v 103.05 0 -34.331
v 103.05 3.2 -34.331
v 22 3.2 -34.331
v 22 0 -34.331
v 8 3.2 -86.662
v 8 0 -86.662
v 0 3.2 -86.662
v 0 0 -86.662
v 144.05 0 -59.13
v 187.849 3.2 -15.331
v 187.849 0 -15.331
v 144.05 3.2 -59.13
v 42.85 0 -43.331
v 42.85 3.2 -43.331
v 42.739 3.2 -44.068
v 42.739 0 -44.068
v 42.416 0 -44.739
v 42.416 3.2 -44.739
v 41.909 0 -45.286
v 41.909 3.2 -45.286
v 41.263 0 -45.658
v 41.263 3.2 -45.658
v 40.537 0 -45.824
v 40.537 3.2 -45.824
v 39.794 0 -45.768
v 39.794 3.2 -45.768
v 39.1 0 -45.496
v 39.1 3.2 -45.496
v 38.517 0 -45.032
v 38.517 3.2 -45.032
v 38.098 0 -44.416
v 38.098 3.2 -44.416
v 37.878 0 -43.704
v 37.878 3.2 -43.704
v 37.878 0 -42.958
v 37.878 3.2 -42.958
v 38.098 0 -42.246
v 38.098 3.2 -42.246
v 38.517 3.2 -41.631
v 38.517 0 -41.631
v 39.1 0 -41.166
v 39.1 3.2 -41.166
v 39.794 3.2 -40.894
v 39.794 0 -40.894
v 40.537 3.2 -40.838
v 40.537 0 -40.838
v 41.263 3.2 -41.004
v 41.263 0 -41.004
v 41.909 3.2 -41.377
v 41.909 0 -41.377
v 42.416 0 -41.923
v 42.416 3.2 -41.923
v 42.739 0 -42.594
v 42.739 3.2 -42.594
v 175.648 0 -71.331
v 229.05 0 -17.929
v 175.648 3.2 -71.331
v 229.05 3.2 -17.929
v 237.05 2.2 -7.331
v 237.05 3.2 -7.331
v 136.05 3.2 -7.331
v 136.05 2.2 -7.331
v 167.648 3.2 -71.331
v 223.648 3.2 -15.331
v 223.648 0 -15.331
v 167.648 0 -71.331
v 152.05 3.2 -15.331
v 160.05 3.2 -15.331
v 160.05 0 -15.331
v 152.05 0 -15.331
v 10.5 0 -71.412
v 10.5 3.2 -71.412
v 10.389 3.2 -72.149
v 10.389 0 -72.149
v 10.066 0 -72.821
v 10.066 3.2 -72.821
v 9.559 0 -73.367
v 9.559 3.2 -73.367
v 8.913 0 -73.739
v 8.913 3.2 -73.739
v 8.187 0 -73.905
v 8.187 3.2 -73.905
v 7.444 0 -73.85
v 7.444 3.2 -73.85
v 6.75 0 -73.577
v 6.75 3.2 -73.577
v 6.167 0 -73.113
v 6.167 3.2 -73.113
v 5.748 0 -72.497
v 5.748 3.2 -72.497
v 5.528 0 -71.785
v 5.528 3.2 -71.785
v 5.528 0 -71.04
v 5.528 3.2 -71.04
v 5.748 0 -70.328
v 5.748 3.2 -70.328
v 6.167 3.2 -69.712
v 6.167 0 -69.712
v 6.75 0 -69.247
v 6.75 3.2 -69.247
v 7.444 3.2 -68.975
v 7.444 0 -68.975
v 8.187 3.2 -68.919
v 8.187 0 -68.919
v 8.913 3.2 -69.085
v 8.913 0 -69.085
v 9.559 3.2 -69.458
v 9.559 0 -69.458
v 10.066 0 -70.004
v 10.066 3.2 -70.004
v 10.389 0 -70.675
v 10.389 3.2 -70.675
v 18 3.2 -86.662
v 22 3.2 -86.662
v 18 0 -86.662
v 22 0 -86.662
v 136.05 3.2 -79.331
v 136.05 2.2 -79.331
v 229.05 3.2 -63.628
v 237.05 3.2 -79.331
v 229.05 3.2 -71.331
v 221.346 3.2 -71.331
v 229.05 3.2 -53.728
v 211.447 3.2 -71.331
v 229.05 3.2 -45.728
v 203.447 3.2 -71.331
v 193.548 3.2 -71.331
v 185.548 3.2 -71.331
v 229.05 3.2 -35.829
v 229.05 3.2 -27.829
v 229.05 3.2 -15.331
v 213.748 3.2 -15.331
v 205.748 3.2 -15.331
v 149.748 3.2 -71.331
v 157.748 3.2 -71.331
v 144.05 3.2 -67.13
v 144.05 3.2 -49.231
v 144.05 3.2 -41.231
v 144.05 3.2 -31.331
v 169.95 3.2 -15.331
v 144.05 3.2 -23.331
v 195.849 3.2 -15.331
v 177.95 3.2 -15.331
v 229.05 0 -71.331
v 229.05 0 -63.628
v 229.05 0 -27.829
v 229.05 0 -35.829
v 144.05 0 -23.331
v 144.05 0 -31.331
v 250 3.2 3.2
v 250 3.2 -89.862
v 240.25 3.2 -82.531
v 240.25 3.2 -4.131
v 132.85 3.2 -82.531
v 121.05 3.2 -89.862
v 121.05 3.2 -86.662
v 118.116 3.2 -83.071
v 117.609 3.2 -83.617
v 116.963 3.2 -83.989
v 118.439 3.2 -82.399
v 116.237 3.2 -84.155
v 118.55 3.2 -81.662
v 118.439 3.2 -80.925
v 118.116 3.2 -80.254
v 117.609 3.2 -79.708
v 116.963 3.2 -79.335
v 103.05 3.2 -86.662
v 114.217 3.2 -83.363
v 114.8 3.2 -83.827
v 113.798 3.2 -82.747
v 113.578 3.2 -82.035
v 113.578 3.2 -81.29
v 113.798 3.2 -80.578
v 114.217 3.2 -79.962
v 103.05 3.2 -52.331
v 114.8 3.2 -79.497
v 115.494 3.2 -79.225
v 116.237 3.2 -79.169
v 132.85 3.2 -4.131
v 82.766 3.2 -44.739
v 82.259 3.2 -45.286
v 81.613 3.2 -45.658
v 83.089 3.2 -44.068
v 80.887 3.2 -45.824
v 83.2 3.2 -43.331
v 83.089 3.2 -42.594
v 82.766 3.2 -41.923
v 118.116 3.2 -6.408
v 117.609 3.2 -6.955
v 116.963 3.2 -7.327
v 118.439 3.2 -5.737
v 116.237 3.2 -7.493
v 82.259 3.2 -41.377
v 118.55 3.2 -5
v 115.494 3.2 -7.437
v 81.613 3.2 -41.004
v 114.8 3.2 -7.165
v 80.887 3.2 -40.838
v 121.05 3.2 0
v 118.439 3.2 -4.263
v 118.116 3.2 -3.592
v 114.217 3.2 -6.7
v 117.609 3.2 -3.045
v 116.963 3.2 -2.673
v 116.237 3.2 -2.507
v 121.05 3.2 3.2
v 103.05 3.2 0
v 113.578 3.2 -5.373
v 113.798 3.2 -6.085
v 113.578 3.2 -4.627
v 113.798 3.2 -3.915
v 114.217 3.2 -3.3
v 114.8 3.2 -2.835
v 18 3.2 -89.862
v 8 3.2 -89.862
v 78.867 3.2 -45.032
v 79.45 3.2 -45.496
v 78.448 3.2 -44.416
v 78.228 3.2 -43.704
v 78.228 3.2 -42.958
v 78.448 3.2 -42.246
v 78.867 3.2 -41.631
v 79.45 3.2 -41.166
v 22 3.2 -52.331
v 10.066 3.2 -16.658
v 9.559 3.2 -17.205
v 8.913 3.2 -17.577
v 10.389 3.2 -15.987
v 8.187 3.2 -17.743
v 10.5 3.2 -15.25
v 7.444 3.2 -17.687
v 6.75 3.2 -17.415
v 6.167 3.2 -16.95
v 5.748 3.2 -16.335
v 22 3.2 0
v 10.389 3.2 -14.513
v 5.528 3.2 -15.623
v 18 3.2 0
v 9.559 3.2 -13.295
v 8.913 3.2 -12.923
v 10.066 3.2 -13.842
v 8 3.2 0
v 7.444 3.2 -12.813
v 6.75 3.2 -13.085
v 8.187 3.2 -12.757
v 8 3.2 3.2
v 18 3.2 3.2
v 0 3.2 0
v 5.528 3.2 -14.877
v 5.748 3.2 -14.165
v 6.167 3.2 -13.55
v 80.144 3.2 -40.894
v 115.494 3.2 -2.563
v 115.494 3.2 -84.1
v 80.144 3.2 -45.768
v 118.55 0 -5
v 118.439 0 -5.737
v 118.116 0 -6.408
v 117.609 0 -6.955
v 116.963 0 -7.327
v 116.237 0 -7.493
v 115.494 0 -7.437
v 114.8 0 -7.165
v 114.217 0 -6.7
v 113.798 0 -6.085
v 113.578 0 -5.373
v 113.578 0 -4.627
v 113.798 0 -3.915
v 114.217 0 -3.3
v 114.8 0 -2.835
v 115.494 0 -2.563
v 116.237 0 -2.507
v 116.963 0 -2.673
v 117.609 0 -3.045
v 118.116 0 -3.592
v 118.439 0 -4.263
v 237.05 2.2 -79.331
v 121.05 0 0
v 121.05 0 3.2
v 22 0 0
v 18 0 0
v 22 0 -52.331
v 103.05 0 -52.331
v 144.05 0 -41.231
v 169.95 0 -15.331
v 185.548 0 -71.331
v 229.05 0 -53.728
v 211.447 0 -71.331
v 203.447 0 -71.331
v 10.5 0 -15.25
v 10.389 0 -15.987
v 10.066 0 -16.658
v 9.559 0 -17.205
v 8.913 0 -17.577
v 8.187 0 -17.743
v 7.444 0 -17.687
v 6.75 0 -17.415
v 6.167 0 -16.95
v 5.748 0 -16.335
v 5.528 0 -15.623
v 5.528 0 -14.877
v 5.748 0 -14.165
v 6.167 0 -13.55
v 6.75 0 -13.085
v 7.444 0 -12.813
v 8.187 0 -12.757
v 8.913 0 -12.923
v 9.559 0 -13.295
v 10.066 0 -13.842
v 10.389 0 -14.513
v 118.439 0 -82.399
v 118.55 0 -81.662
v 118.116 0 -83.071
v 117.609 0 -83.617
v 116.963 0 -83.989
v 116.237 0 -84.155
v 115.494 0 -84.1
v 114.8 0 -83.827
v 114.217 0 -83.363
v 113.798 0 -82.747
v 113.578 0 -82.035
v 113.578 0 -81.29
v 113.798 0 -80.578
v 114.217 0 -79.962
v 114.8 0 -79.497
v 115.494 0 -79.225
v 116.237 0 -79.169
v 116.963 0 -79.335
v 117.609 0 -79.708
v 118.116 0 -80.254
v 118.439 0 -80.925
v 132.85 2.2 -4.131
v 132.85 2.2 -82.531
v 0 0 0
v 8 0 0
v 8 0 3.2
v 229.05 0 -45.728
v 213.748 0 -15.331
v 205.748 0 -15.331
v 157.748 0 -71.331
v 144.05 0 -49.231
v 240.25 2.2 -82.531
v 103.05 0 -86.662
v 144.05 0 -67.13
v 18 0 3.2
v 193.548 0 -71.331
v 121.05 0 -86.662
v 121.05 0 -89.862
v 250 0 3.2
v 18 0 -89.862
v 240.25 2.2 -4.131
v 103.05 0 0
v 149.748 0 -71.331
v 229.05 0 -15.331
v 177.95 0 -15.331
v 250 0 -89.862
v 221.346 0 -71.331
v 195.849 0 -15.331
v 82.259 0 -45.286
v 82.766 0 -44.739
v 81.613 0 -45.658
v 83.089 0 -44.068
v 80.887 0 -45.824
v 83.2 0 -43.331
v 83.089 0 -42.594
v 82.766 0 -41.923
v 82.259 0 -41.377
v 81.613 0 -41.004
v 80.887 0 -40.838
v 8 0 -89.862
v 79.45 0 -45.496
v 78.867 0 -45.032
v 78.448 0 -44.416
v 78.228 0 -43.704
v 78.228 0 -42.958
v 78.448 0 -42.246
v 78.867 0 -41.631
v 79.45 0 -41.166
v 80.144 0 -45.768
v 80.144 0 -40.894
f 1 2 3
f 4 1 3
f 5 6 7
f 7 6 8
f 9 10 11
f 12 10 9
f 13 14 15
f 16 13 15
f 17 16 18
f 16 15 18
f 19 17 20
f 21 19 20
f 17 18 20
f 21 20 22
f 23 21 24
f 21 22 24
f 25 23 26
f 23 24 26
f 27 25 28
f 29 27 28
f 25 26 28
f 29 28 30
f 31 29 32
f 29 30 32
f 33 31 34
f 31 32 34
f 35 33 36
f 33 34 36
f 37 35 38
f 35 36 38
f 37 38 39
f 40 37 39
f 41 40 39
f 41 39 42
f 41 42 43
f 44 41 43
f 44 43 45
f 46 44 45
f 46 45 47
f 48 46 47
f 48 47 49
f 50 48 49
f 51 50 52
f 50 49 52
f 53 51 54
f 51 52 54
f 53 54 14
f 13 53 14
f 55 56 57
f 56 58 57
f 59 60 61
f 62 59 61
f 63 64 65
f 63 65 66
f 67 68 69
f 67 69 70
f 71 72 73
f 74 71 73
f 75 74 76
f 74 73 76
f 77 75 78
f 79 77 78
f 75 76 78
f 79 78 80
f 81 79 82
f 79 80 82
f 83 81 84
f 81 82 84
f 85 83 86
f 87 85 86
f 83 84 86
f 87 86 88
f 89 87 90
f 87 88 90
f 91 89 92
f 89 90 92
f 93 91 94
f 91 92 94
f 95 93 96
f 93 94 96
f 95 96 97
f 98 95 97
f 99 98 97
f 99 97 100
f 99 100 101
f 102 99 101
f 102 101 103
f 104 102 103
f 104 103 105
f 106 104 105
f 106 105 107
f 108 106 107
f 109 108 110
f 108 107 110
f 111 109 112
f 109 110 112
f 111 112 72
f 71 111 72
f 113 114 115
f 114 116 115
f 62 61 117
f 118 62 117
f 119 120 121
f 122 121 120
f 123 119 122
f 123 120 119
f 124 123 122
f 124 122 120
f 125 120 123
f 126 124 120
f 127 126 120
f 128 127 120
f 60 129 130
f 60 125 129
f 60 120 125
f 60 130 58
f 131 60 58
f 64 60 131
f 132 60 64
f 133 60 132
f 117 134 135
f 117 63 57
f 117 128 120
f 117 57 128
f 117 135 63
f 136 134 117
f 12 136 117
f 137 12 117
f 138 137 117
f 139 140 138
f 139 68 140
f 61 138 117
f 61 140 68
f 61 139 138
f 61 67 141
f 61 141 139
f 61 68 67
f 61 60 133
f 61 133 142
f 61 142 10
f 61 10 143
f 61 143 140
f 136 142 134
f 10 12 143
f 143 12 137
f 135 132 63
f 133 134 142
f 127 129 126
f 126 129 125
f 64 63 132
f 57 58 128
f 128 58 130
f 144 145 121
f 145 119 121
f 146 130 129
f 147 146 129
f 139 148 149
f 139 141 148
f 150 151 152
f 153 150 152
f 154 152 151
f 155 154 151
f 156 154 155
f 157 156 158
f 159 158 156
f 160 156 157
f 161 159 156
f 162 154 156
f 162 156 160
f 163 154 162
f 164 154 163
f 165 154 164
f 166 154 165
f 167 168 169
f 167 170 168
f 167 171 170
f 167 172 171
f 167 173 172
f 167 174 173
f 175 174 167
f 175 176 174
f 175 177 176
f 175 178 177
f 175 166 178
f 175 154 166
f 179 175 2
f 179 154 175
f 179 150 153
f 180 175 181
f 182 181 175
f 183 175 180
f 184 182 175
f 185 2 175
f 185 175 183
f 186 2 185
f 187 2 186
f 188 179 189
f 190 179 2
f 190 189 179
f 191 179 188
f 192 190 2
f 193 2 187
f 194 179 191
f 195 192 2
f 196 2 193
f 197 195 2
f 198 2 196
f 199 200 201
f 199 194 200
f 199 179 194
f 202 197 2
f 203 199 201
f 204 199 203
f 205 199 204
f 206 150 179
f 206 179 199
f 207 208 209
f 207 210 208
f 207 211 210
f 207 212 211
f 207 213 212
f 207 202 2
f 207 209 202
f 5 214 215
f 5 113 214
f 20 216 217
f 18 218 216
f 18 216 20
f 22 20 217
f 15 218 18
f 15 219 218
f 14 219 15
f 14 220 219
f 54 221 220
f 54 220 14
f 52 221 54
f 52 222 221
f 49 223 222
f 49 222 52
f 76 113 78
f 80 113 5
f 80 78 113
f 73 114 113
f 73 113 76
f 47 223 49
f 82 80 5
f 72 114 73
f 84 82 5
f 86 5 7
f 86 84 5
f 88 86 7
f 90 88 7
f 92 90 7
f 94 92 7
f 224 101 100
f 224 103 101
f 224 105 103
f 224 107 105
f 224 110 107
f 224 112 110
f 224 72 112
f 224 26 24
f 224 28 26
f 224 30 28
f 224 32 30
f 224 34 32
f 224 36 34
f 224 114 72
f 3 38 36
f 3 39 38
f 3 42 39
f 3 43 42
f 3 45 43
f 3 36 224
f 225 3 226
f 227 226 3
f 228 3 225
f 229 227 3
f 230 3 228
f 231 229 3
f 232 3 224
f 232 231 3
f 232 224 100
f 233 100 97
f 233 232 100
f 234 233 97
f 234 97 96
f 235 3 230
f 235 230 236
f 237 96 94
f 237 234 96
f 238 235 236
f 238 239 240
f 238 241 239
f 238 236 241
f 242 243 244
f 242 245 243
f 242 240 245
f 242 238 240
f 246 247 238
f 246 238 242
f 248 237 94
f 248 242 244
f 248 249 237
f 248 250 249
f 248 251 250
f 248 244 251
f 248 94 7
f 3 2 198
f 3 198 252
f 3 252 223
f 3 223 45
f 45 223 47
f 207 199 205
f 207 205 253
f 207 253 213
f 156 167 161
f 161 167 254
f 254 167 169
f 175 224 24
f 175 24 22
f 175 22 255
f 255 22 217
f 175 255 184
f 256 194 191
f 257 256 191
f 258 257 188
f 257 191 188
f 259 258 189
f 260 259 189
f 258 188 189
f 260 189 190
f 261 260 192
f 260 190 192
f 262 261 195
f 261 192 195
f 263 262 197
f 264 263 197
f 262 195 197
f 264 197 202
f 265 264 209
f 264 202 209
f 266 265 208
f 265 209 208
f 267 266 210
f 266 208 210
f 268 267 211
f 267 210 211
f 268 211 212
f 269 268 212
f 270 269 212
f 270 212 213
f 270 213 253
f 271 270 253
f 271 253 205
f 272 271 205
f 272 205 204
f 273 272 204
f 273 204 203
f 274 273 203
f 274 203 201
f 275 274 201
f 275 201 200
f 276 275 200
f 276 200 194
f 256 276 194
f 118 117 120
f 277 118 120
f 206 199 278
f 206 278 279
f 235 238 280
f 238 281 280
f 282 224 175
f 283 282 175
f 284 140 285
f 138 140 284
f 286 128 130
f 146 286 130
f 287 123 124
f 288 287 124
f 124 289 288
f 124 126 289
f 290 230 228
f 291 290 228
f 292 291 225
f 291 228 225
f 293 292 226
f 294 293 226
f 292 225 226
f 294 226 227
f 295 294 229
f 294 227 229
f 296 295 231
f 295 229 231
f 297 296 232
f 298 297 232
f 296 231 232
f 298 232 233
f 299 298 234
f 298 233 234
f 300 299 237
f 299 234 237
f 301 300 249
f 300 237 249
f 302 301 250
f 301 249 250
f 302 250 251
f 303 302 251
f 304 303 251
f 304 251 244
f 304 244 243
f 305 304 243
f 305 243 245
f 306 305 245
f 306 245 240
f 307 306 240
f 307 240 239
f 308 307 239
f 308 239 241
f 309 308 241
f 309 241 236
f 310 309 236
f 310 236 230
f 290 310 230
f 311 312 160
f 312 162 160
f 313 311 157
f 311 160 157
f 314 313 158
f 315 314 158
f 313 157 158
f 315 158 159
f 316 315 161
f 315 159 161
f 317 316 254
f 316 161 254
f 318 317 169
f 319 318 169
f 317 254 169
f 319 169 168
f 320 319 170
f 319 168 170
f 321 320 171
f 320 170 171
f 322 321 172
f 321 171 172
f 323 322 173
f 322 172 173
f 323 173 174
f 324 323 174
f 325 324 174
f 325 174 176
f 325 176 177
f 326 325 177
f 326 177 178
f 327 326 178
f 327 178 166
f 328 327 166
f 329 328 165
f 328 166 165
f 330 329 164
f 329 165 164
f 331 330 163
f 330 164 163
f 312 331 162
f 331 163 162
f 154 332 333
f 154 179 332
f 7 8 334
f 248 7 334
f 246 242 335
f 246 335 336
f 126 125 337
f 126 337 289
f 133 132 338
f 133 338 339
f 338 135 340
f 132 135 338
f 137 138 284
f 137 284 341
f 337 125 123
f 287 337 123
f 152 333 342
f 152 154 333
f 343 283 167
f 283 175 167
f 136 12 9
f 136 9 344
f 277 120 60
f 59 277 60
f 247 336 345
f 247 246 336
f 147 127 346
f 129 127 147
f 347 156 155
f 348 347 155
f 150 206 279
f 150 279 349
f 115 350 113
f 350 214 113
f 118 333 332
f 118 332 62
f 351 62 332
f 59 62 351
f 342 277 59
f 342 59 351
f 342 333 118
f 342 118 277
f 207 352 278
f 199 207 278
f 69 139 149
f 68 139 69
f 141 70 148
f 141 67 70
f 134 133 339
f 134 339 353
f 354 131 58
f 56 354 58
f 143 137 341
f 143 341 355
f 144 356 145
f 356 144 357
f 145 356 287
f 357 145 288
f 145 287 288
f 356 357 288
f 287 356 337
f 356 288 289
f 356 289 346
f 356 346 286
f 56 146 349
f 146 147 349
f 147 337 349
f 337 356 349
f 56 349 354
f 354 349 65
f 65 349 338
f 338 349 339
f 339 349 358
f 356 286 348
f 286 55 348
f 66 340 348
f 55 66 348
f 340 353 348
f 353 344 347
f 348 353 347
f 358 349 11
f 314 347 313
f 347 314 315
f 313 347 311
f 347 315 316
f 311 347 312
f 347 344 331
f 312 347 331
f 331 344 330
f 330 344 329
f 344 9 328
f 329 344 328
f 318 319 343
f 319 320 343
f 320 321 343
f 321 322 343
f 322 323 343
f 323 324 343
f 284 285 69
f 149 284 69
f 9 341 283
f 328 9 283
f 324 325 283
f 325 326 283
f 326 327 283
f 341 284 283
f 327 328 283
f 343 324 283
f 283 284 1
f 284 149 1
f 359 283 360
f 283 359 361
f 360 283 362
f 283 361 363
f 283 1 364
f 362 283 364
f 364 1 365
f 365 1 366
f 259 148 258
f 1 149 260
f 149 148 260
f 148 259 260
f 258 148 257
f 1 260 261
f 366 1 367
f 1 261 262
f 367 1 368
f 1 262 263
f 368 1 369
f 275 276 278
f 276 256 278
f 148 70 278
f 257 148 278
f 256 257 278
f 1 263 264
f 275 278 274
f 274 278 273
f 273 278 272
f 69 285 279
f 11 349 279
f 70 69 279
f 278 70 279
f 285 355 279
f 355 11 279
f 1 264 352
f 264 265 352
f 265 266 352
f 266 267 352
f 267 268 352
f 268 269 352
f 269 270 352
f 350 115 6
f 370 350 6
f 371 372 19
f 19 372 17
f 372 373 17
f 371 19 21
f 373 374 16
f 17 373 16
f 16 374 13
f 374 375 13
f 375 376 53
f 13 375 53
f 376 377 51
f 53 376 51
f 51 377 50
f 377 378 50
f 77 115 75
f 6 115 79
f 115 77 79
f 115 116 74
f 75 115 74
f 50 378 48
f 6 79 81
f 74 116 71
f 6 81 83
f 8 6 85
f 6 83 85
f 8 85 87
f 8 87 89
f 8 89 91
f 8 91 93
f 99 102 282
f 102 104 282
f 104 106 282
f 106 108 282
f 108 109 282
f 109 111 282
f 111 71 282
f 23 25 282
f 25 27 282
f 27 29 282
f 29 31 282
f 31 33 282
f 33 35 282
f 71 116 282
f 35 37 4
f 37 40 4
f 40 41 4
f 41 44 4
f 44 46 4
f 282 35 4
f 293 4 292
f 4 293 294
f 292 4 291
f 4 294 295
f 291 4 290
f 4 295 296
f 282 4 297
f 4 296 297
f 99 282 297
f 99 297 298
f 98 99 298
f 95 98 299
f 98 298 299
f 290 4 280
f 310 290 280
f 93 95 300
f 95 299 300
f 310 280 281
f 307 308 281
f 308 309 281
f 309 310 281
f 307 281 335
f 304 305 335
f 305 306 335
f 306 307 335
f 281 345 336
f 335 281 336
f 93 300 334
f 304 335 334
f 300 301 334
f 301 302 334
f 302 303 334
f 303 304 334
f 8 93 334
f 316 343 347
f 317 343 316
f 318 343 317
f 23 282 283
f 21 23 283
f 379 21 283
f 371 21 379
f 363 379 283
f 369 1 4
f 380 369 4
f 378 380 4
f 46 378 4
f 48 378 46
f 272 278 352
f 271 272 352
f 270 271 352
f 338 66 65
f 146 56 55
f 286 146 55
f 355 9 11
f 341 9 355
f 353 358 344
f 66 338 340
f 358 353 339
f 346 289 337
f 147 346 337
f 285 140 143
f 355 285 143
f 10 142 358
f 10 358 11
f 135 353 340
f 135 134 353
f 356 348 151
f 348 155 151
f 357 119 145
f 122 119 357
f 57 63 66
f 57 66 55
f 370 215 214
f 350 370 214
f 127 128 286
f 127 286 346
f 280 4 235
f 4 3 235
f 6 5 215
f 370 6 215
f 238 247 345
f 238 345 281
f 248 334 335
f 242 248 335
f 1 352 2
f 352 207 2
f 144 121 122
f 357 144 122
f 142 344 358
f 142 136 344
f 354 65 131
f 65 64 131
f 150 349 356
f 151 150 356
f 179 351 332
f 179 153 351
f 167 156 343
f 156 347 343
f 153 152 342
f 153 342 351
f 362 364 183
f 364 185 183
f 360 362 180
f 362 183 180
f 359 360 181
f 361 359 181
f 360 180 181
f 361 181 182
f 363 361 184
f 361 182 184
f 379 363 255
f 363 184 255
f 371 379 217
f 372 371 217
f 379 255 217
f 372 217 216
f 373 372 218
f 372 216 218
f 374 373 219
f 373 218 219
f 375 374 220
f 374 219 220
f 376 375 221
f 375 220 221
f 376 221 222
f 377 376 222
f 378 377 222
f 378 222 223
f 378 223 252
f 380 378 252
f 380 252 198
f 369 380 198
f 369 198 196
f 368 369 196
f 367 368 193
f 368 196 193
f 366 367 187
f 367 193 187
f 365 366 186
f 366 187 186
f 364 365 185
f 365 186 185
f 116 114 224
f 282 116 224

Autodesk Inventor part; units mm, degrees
ref_plane "YZ Plane" through (0, 0, 0) normal (1, 0, 0) x (0, 1, 0)
ref_plane "XZ Plane" through (0, 0, 0) normal (0, 1, 0) x (-1, 0, 0)
ref_plane "XY Plane" through (0, 0, 0) normal (0, 0, 1) x (1, 0, 0)
sketch "Sketch9" plane through (0, 0, 0) normal (0, 1, 0) x (-1, 0, 0)
  line L0 (0, 0) -> (-250, 0)
  line L1 (-250, 0) -> (-250, -86.6623)
  line L2 (-250, -86.6623) -> (0, -86.6623)
  line L3 (0, -86.6623) -> (0, 0)
  dimension "d59" = 86.6623
  dimension "d60" = 250
extrude "Extrusion5" add sketch "Sketch9" along normal blind 3.2
sketch "Sketch10" plane through (0, 3.2, 0) normal (0, 1, 0) x (1, 0, 0)
  line L0 (22, 0) -> (103.05, 0)
  line L1 (103.05, 0) -> (103.05, 34.3311)
  line L2 (103.05, 34.3311) -> (22, 34.3311)
  line L3 (22, 34.3311) -> (22, 0)
  line L4 (250, 86.6623) -> (0, 86.6623) projected
  line L5 (103.05, 86.6623) -> (22, 86.6623)
  line L6 (22, 86.6623) -> (22, 52.3311)
  line L7 (22, 52.3311) -> (103.05, 52.3311)
  line L8 (103.05, 52.3311) -> (103.05, 86.6623)
  line L9 (0, 0) -> (250, 0) projected
  line L10 (0, 86.6623) -> (0, 0) projected
  dimension "d63" = 22
  dimension "d64" = 34.3311
  dimension "d65" = 81.05
  dimension "d66" = 34.3311
extrude "Extrusion6" cut sketch "Sketch10" against normal blind 3.2
sketch "Sketch11" plane through (0, 3.2, 0) normal (0, 1, 0) x (1, 0, 0)
  line L0 (237.05, 7.3311) -> (136.05, 7.3311)
  line L1 (136.05, 7.3311) -> (136.05, 79.3311)
  line L2 (136.05, 79.3311) -> (237.05, 79.3311)
  line L3 (237.05, 79.3311) -> (237.05, 7.3311)
  line L4 (103.05, 86.6623) -> (103.05, 52.3311) projected
  line L5 (0, 86.6623) -> (0, 0) projected
  line L6 (103.05, 0) -> (250, 0) projected
  line L7 (121.05, 0) -> (121.05, 86.188) construction
  line L8 (103.05, 34.3311) -> (103.05, 0) projected
  line L9 (240.25, 4.1311) -> (132.85, 4.1311)
  line L10 (132.85, 4.1311) -> (132.85, 82.5311)
  line L11 (132.85, 82.5311) -> (240.25, 82.5311)
  line L12 (240.25, 82.5311) -> (240.25, 4.1311)
  dimension "d69" = 72
  dimension "d70" = 101
  dimension "d71" = 33
  dimension "d72" = 86.6623
  dimension "d73" = 7.3311
  dimension "d74" = 18
  dimension "d75" = 3.2
  dimension "d76" = 3.2
  dimension "d77" = 3.2
  dimension "d78" = 3.2
extrude "Extrusion7" cut sketch "Sketch11" against normal blind 1
sketch "Sketch12" plane through (0, 3.2, 0) normal (0, 1, 0) x (1, 0, 0)
  line L0 (237.05, 7.3311) -> (237.05, 79.3311) projected
  line L1 (237.05, 79.3311) -> (136.05, 79.3311) projected
  line L2 (136.05, 79.3311) -> (136.05, 7.3311) construction
  line L3 (136.05, 7.3311) -> (237.05, 7.3311) projected
  line L4 (144.05, 15.3311) -> (229.05, 15.3311) construction
  line L5 (229.05, 15.3311) -> (229.05, 71.3311) construction
  line L6 (229.05, 71.3311) -> (144.05, 71.3311) construction
  line L7 (144.05, 71.3311) -> (144.05, 15.3311) construction
  line L8 (152.05, 15.3311) -> (144.05, 23.3311)
  line L9 (144.05, 23.3311) -> (144.05, 31.3311)
  line L10 (144.05, 31.3311) -> (160.05, 15.3311)
  line L11 (160.05, 15.3311) -> (152.05, 15.3311)
  line L12 (169.9495, 15.3311) -> (144.05, 41.2306)
  line L13 (144.05, 41.2306) -> (144.05, 49.2306)
  line L14 (144.05, 49.2306) -> (177.9495, 15.3311)
  line L15 (169.9495, 15.3311) -> (177.9495, 15.3311)
  line L16 (187.849, 15.3311) -> (144.05, 59.1301)
  line L17 (144.05, 59.1301) -> (144.05, 67.1301)
  line L18 (144.05, 67.1301) -> (195.849, 15.3311)
  line L19 (195.849, 15.3311) -> (187.849, 15.3311)
  line L20 (213.7485, 15.3311) -> (205.7485, 15.3311)
  line L21 (157.7485, 71.3311) -> (213.7485, 15.3311)
  line L22 (223.648, 15.3311) -> (167.648, 71.3311)
  line L23 (185.5475, 71.3311) -> (193.5475, 71.3311)
  line L24 (193.5475, 71.3311) -> (229.05, 35.8286)
  line L25 (229.05, 45.7281) -> (203.447, 71.3311)
  line L26 (203.447, 71.3311) -> (211.447, 71.3311)
  line L27 (229.05, 63.6276) -> (221.3465, 71.3311)
  line L28 (229.05, 45.7281) -> (229.05, 53.7281)
  line L29 (229.05, 53.7281) -> (211.447, 71.3311)
  line L30 (205.7485, 15.3311) -> (149.7485, 71.3311)
  line L31 (149.7485, 71.3311) -> (157.7485, 71.3311)
  line L32 (185.5475, 71.3311) -> (229.05, 27.8286)
  line L33 (229.05, 27.8286) -> (229.05, 35.8286)
  line L34 (223.648, 15.3311) -> (229.05, 15.3311)
  line L35 (229.05, 15.3311) -> (229.05, 17.9291)
  line L36 (229.05, 17.9291) -> (175.648, 71.3311)
  line L37 (167.648, 71.3311) -> (175.648, 71.3311)
  line L38 (229.05, 63.6276) -> (229.05, 71.3311)
  line L39 (229.05, 71.3311) -> (221.3465, 71.3311)
  point P0 (0, 0)
  dimension "d81" = 8
  dimension "d82" = 8
  dimension "d83" = 8
  dimension "d84" = 8
  dimension "d85" = 8
  dimension "d86" = 8
  dimension "d88" = 7
  dimension "d90" = 7
  dimension "d92" = 7
  dimension "d95" = 7
  dimension "d97" = 7
  dimension "d98" = 7
  dimension "d100" = 7
extrude "Extrusion8" cut sketch "Sketch12" against normal up to surface (3.2 mm away)
sketch "Sketch13" plane through (0, 3.2, 0) normal (0, 1, 0) x (1, 0, 0)
  circle A0 centre (116.05, 5) radius 2.5
  circle A1 centre (116.05, 81.6623) radius 2.5
  circle A2 centre (40.35, 43.3311) radius 2.5
  circle A3 centre (80.7, 43.3311) radius 2.5
  line L0 (0, 86.6623) -> (0, 0) projected
  line L1 (103.05, 0) -> (250, 0) projected
  line L2 (103.05, 34.3311) -> (103.05, 0) projected
  line L3 (250, 86.6623) -> (103.05, 86.6623) projected
  circle A4 centre (8, 15.25) radius 2.5
  circle A5 centre (8, 71.4123) radius 2.5
  line L4 (0, 0) -> (22, 0) projected
  line L5 (22, 86.6623) -> (0, 86.6623) projected
  point P0 (0, 43.3311)
  dimension "d103" = 40.35
  dimension "d104" = 40.35
  dimension "d105" = 5
  dimension "d106" = 5
  dimension "d107" = 13
  dimension "d108" = 5
  dimension "d109" = 15.25
  dimension "d110" = 15.25
  dimension "d111" = 8
extrude "Extrusion9" cut sketch "Sketch13" against normal up to surface (3.2 mm away)
sketch "Sketch14" plane through (0, 3.2, 0) normal (0, 1, 0) x (1, 0, 0)
  line L0 (250, 0) -> (250, 86.6623) projected
  line L1 (103.05, 34.3311) -> (103.05, 0) projected
  point P0 (0, 0)
  dimension "largo_abdomen_robot" = 146.95
sketch "Sketch15" plane through (0, 3.2, 0) normal (0, 1, 0) x (1, 0, 0)
  line L0 (250, 0) -> (250, 86.6623) projected
  line L1 (250, 86.6623) -> (121.05, 86.6623)
  line L2 (121.05, 86.6623) -> (121.05, 89.8623)
  line L3 (121.05, 89.8623) -> (250, 89.8623)
  line L4 (250, 89.8623) -> (250, 86.6623)
  line L5 (250, 0) -> (121.05, 0)
  line L6 (121.05, 0) -> (121.05, -3.2)
  line L7 (121.05, -3.2) -> (250, -3.2)
  line L8 (250, -3.2) -> (250, 0)
  point P0 (0, 0)
  dimension "d115" = 128.95
  dimension "d116" = 3.2
extrude "Extrusion10" add sketch "Sketch15" against normal up to surface (3.2 mm away)
sketch "Sketch16" plane through (0, 3.2, 0) normal (0, 1, 0) x (1, 0, 0)
  line L0 (0, 0) -> (22, 0) projected
  line L1 (18, 0) -> (8, 0)
  line L2 (8, 0) -> (8, -3.2)
  line L3 (8, -3.2) -> (18, -3.2)
  line L4 (18, -3.2) -> (18, 0)
  line L5 (18, 86.6623) -> (8, 86.6623)
  line L6 (8, 86.6623) -> (8, 89.8623)
  line L7 (8, 89.8623) -> (18, 89.8623)
  line L8 (18, 89.8623) -> (18, 86.6623)
  line L9 (22, 86.6623) -> (0, 86.6623) projected
  line L10 (22, 0) -> (22, 34.3311) projected
  dimension "d119" = 4
  dimension "d120" = 10
  dimension "d121" = 3.2
extrude "Extrusion11" add sketch "Sketch16" against normal up to surface (3.2 mm away)
equation "\"d59\" = ancho_acople_hombros"
equation "\"d63\" = acople_hombro_grosor_frontal"
equation "\"d64\" = acople_hombro_ancho_agujero"
equation "\"d65\" = acople_hombro_largo_agujero"
equation "\"d66\" = acople_hombro_ancho_agujero"
equation "\"d73\" = -0.5 * d69 + 0.5 * d72"
equation "\"d74\" = acople_hombro_grosor_trasero"
equation "\"d76\" = d75"
equation "\"d77\" = d76"
equation "\"d78\" = d75"
equation "\"d82\" = d81"
equation "\"d83\" = d81"
equation "\"d84\" = d81"
equation "\"d86\" = d85"
equation "\"d88\" = d95"
equation "\"d90\" = d95"
equation "\"d92\" = d91"
equation "\"d97\" = d92"
equation "\"d98\" = d95"
equation "\"d100\" = d95"
equation "\"d103\" = dist_agujero_central_a_frente"
equation "\"d104\" = d103"
equation "\"d105\" = diametro_tornillo"
equation "\"d106\" = dist_agujero_trasero_a_lado"
equation "\"d107\" = dist_agujero_trasero_a_frente"
equation "\"d108\" = d106"
equation "\"d109\" = dist_agujero_frontal_a_lateral"
equation "\"d110\" = d109"
equation "\"d111\" = dist_agujero_frontal_a_frente"
equation "\"d115\" = largo_abdomen_robot - acople_hombro_grosor_trasero"
equation "\"d91\" = d90"
equation "\"ancho_acople_hombros\" = 86.662258"
equation "\"acople_hombro_grosor_frontal\" = 22"
equation "\"acople_hombro_ancho_agujero\" = 34.331129"
equation "\"acople_hombro_largo_agujero\" = 81.05"
equation "\"acople_hombro_grosor_trasero\" = 18"
equation "\"dist_agujero_central_a_frente\" = 40.35"
equation "\"diametro_tornillo\" = 5"
equation "\"dist_agujero_trasero_a_lado\" = 5"
equation "\"dist_agujero_trasero_a_frente\" = 13"
equation "\"dist_agujero_frontal_a_lateral\" = 15.25"
equation "\"dist_agujero_frontal_a_frente\" = 8"
properties part number "cuerpo-base-bateria"
